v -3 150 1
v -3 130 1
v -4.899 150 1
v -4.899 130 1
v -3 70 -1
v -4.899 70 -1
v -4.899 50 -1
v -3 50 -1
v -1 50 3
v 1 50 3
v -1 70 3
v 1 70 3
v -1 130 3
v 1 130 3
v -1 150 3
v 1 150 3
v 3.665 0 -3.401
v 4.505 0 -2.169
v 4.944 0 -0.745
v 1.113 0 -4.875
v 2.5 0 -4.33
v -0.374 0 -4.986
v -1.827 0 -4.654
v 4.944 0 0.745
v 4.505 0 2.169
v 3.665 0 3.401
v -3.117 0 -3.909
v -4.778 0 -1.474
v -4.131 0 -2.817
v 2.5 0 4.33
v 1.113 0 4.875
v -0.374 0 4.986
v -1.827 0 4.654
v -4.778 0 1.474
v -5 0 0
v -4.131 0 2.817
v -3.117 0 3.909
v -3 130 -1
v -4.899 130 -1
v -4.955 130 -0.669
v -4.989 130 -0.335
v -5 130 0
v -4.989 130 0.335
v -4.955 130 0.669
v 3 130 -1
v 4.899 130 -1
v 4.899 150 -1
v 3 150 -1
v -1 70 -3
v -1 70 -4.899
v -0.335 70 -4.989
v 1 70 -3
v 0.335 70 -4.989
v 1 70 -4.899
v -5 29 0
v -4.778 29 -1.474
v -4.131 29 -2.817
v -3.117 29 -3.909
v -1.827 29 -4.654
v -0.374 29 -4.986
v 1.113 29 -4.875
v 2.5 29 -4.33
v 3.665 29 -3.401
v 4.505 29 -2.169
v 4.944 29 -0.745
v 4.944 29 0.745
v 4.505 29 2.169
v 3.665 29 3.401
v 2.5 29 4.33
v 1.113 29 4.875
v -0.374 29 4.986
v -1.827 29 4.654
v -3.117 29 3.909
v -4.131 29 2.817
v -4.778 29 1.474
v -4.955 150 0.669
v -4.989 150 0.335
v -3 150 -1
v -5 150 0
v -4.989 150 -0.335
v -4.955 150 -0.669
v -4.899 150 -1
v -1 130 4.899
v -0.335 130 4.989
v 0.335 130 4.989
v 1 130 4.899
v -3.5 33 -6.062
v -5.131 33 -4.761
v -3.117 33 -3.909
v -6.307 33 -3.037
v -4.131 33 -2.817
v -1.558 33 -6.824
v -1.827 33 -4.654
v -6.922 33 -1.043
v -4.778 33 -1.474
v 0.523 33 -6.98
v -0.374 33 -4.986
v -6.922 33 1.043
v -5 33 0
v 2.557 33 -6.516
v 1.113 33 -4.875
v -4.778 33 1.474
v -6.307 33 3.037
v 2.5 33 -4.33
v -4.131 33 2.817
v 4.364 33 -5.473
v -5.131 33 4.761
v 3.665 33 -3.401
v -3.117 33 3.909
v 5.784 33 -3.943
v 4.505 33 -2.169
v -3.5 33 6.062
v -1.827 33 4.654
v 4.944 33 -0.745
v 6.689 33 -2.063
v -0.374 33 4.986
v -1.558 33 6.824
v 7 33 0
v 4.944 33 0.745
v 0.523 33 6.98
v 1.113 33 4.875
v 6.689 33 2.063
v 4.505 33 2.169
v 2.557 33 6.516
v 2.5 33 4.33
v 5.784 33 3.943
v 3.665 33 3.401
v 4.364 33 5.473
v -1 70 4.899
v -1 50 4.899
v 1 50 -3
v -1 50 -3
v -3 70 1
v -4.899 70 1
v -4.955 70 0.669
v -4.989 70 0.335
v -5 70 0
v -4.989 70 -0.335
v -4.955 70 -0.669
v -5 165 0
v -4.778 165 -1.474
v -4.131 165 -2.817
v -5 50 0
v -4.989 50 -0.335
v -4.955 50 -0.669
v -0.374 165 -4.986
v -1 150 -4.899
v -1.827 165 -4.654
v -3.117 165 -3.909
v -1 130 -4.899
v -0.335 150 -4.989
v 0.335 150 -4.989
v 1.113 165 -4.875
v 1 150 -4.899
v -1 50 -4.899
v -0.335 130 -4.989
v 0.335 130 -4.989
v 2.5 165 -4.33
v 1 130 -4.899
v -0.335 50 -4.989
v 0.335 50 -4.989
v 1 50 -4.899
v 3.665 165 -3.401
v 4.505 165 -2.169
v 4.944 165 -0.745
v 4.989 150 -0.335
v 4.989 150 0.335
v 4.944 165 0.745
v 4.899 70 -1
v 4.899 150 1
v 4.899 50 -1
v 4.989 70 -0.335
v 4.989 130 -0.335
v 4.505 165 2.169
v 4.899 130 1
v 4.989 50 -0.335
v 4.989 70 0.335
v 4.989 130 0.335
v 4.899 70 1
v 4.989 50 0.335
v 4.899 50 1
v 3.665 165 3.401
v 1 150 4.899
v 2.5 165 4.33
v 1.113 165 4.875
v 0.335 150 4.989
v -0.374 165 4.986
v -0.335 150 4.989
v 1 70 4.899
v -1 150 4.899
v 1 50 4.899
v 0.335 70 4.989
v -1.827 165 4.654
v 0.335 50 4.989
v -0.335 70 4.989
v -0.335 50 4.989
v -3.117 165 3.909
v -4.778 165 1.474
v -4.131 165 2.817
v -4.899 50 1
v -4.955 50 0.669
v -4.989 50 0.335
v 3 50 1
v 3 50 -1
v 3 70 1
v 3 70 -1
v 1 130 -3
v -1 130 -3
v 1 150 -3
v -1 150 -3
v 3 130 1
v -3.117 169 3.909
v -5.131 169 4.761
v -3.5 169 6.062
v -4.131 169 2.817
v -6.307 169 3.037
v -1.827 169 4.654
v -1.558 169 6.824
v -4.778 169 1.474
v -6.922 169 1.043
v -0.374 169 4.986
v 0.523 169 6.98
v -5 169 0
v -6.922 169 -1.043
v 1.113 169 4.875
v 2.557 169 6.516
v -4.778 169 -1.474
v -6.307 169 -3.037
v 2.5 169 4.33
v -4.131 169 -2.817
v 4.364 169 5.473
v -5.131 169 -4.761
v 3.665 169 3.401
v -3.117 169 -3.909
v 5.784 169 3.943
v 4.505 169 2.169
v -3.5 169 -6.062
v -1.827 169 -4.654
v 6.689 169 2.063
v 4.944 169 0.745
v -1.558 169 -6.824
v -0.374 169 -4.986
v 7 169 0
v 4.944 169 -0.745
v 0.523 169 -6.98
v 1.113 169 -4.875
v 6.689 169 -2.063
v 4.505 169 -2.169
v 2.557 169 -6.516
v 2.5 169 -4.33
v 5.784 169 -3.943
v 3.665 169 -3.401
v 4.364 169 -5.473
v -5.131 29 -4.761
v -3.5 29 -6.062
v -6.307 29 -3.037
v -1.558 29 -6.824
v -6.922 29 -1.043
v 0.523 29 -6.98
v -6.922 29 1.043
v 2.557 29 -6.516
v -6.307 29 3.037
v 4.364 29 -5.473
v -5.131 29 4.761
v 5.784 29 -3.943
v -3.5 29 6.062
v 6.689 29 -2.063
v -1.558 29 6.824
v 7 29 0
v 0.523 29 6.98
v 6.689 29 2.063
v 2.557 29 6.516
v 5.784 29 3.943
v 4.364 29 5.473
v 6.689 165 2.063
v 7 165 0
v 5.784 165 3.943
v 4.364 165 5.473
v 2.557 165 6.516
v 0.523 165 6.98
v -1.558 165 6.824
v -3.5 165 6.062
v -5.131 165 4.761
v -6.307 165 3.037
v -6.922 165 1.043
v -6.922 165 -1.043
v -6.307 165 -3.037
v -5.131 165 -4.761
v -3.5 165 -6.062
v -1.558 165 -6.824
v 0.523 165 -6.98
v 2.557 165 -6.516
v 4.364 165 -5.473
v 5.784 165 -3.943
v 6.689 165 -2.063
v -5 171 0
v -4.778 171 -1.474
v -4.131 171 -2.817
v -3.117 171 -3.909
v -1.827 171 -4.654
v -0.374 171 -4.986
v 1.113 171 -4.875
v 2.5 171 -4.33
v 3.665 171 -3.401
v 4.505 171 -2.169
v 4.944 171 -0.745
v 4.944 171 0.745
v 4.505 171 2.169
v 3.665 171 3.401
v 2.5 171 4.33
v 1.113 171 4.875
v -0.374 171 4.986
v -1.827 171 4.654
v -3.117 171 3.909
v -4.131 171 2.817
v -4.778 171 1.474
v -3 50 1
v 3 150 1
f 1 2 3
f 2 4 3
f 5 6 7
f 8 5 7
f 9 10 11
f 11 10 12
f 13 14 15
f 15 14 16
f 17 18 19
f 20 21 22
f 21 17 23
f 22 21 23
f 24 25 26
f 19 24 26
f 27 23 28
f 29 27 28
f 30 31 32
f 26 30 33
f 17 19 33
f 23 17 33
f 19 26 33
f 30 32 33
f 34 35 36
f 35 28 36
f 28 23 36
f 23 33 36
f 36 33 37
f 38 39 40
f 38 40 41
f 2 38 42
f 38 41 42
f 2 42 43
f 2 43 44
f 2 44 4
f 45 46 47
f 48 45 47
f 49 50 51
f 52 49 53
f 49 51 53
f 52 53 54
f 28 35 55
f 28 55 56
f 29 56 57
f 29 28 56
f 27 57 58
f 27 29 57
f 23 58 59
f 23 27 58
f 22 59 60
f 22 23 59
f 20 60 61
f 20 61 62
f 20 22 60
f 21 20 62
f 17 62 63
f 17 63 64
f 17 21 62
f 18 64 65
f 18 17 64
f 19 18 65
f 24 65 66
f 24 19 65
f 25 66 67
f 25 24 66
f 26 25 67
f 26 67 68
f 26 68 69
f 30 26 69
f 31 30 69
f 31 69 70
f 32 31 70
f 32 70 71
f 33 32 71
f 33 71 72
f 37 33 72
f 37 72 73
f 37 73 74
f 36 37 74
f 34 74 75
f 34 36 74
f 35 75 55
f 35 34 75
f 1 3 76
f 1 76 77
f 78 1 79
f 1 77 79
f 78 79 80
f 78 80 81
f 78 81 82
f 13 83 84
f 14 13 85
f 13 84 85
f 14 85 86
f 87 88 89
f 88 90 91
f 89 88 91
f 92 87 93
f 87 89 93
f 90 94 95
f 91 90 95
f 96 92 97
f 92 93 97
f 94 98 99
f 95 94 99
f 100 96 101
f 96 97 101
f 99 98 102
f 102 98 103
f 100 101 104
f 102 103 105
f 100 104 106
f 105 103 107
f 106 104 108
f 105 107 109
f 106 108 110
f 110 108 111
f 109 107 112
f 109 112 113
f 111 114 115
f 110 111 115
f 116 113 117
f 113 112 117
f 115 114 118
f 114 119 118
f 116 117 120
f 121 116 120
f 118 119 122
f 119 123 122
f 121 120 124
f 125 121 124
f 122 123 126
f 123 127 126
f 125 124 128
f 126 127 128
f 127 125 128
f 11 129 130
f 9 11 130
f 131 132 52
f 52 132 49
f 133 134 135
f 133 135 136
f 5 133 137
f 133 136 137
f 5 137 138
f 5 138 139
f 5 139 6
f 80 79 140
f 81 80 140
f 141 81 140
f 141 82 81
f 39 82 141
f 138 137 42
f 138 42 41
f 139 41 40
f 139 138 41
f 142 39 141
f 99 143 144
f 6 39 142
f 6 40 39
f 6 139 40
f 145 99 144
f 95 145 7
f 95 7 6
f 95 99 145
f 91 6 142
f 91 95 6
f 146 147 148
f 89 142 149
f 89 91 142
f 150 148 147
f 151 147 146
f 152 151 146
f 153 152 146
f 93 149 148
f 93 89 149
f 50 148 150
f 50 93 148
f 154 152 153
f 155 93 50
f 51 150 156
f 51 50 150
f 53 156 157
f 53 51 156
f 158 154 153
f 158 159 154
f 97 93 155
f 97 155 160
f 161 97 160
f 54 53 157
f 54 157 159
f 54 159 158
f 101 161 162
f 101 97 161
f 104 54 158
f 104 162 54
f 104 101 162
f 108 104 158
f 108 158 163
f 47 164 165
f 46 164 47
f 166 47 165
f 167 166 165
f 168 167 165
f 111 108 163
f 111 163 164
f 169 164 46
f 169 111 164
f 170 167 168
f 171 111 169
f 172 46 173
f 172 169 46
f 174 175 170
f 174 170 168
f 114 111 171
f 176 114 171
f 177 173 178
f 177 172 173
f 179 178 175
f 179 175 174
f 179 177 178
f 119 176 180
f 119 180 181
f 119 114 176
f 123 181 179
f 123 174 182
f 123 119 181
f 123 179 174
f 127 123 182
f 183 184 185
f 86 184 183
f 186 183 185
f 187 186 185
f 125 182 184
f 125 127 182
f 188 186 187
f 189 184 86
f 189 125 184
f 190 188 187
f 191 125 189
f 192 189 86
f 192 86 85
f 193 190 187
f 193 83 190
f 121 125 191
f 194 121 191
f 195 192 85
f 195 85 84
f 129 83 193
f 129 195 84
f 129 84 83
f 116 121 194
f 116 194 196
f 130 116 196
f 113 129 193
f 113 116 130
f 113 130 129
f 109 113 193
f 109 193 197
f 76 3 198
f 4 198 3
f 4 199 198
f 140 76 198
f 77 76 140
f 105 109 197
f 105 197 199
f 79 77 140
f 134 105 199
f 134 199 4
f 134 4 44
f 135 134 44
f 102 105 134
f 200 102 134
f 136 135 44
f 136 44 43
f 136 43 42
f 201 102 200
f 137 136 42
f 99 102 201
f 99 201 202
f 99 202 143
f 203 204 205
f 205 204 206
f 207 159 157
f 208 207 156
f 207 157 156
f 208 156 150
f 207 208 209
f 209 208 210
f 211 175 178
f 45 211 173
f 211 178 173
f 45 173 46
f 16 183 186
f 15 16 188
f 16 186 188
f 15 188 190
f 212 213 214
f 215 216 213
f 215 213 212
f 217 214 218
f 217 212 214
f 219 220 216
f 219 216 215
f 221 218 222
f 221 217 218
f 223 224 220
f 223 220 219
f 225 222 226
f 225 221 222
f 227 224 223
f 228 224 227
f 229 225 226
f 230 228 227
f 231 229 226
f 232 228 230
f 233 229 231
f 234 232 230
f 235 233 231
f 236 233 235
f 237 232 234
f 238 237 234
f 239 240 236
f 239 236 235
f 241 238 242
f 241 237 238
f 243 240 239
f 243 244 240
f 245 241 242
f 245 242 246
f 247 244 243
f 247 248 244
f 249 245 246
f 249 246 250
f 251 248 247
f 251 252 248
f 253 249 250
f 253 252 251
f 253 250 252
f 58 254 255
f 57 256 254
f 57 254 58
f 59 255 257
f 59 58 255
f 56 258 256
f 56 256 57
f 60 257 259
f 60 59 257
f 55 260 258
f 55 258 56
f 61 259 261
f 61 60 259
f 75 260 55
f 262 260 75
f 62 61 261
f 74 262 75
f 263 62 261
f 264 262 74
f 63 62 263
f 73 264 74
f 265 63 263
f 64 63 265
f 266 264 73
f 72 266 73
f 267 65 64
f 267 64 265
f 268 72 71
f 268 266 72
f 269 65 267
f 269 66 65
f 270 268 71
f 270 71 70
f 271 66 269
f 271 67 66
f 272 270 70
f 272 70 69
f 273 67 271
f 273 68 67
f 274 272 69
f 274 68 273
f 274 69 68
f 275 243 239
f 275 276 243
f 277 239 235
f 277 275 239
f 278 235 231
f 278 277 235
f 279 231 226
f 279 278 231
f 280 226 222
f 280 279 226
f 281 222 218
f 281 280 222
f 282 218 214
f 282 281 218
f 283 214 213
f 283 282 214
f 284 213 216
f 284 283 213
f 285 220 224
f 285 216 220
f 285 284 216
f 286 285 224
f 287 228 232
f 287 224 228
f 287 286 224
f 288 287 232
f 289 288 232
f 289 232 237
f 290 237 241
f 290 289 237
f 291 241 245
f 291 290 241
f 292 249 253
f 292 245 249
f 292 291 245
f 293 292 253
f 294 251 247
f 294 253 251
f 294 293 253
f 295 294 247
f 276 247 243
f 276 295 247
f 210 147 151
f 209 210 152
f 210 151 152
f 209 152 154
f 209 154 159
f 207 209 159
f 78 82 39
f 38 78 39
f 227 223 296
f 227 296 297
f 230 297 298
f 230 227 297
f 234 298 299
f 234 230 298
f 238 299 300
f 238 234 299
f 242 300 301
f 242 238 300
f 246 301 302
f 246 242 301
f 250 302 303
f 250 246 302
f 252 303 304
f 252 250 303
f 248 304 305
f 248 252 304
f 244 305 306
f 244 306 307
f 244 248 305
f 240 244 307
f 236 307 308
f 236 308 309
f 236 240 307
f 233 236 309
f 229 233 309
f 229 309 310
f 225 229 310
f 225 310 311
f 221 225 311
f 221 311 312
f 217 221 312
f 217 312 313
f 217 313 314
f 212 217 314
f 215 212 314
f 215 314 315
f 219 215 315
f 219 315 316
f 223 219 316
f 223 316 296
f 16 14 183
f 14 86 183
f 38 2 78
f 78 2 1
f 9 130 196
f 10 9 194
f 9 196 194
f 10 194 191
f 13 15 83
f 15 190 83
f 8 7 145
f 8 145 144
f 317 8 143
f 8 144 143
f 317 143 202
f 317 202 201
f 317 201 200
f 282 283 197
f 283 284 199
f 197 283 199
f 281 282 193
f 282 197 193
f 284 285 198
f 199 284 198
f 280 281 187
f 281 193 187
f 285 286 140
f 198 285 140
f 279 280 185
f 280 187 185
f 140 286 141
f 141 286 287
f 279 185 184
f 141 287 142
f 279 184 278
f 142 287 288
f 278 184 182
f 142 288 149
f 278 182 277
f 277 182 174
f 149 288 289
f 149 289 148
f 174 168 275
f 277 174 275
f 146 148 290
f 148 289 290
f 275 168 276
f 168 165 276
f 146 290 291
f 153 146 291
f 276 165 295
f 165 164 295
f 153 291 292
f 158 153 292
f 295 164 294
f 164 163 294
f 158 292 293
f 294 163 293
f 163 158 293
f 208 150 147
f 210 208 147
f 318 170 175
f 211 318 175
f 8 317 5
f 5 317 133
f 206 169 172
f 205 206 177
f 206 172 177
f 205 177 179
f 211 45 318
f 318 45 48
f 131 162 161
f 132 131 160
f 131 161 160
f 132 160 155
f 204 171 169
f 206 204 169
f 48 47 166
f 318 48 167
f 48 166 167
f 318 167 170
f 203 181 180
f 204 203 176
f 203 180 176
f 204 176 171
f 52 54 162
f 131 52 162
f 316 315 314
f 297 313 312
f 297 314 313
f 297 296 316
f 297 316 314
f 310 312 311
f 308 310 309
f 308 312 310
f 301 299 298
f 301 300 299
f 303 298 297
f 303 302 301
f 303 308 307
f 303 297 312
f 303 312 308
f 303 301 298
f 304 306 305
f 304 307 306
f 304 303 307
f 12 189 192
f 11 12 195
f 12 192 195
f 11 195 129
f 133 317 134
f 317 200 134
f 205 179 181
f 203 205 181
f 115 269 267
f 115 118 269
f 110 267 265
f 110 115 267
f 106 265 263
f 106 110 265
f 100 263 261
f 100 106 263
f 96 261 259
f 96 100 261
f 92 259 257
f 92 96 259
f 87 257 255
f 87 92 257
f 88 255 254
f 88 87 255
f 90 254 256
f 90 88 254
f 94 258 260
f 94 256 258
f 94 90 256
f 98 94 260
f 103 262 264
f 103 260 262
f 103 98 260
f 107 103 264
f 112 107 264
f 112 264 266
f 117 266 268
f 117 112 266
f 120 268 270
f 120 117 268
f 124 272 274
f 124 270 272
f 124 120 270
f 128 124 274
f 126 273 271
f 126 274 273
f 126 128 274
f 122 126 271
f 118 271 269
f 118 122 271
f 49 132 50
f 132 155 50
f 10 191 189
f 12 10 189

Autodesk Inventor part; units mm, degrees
sketch "Sketch1" plane through (0, 0, 0) normal (0, 1, 0) x (-1, 0, 0)
  circle A0 centre (0, 0) radius 5
  point P0 (0, 5)
  dimension "d0" = 10
extrude "Extrusion1" add sketch "Sketch1" along normal blind 180
ref_plane "Work Plane1" through (-5, 0, 0) normal (1, 0, 0) x (0, 1, 0)
ref_plane "Work Plane4" through (0, 33, 0) normal (0, -1, 0) x (1, 0, 0)
sketch "Sketch7" plane through (0, 33, 0) normal (0, -1, 0) x (1, 0, 0)
  circle A0 centre (0, 0) radius 7
  dimension "d29" = 14
extrude "Extrusion7" add sketch "Sketch7" along normal blind 4
ref_plane "Work Plane5" through (0, 165, 0) normal (0, 1, 0) x (1, 0, 0)
sketch "Sketch8" plane through (0, 165, 0) normal (0, 1, 0) x (1, 0, 0)
  circle A0 centre (0, 0) radius 7
  dimension "d33" = 14
extrude "Extrusion8" add sketch "Sketch8" along normal blind 4
sketch "Sketch2" plane through (-5, 0, 0) normal (1, 0, 0) x (0, 1, 0)
  line L0 (150, -1) -> (130, -1)
  line L1 (130, -1) -> (130, 1)
  line L2 (130, 1) -> (150, 1)
  line L3 (150, 1) -> (150, -1)
  line L4 (150, 0) -> (130, 0) construction
  line L5 (180, -5) -> (180, 5) construction
  line L6 (180, 0) -> (0, 0) construction
  line L7 (0, 5) -> (0, -5) construction
  line L8 (70, -1) -> (50, -1)
  line L9 (50, -1) -> (50, 1)
  line L10 (50, 1) -> (70, 1)
  line L11 (70, 1) -> (70, -1)
  line L12 (70, 0) -> (50, 0) construction
  line L13 (165, 7) -> (165, -7) projected
  line L14 (33, -7) -> (33, 7) projected
  line L15 (169, -7) -> (169, 7) projected
  dimension "d3" = 20
  dimension "d4" = 2
  dimension "d6" = 20
  dimension "d7" = 2
  dimension "d36" = 15
  dimension "d37" = 17
  dimension "d38" = 60
  dimension "d40" = 15
  dimension "d41" = 33
extrude "Extrusion2" cut sketch "Sketch2" along normal blind 2
pattern_circular "Circular Pattern1" count 4 over 360 about axis through (0, -10, 0) along (0, 1, 0) of "Extrusion2"
sketch "Sketch9" plane through (0, 180, 0) normal (0, 1, 0) x (1, 0, 0)
  circle A0 centre (0, 0) radius 5
  dimension "d42" = 10
extrude "Extrusion9" cut sketch "Sketch9" against normal blind 9
properties part number "middleRod" material "Aluminum 6061"
